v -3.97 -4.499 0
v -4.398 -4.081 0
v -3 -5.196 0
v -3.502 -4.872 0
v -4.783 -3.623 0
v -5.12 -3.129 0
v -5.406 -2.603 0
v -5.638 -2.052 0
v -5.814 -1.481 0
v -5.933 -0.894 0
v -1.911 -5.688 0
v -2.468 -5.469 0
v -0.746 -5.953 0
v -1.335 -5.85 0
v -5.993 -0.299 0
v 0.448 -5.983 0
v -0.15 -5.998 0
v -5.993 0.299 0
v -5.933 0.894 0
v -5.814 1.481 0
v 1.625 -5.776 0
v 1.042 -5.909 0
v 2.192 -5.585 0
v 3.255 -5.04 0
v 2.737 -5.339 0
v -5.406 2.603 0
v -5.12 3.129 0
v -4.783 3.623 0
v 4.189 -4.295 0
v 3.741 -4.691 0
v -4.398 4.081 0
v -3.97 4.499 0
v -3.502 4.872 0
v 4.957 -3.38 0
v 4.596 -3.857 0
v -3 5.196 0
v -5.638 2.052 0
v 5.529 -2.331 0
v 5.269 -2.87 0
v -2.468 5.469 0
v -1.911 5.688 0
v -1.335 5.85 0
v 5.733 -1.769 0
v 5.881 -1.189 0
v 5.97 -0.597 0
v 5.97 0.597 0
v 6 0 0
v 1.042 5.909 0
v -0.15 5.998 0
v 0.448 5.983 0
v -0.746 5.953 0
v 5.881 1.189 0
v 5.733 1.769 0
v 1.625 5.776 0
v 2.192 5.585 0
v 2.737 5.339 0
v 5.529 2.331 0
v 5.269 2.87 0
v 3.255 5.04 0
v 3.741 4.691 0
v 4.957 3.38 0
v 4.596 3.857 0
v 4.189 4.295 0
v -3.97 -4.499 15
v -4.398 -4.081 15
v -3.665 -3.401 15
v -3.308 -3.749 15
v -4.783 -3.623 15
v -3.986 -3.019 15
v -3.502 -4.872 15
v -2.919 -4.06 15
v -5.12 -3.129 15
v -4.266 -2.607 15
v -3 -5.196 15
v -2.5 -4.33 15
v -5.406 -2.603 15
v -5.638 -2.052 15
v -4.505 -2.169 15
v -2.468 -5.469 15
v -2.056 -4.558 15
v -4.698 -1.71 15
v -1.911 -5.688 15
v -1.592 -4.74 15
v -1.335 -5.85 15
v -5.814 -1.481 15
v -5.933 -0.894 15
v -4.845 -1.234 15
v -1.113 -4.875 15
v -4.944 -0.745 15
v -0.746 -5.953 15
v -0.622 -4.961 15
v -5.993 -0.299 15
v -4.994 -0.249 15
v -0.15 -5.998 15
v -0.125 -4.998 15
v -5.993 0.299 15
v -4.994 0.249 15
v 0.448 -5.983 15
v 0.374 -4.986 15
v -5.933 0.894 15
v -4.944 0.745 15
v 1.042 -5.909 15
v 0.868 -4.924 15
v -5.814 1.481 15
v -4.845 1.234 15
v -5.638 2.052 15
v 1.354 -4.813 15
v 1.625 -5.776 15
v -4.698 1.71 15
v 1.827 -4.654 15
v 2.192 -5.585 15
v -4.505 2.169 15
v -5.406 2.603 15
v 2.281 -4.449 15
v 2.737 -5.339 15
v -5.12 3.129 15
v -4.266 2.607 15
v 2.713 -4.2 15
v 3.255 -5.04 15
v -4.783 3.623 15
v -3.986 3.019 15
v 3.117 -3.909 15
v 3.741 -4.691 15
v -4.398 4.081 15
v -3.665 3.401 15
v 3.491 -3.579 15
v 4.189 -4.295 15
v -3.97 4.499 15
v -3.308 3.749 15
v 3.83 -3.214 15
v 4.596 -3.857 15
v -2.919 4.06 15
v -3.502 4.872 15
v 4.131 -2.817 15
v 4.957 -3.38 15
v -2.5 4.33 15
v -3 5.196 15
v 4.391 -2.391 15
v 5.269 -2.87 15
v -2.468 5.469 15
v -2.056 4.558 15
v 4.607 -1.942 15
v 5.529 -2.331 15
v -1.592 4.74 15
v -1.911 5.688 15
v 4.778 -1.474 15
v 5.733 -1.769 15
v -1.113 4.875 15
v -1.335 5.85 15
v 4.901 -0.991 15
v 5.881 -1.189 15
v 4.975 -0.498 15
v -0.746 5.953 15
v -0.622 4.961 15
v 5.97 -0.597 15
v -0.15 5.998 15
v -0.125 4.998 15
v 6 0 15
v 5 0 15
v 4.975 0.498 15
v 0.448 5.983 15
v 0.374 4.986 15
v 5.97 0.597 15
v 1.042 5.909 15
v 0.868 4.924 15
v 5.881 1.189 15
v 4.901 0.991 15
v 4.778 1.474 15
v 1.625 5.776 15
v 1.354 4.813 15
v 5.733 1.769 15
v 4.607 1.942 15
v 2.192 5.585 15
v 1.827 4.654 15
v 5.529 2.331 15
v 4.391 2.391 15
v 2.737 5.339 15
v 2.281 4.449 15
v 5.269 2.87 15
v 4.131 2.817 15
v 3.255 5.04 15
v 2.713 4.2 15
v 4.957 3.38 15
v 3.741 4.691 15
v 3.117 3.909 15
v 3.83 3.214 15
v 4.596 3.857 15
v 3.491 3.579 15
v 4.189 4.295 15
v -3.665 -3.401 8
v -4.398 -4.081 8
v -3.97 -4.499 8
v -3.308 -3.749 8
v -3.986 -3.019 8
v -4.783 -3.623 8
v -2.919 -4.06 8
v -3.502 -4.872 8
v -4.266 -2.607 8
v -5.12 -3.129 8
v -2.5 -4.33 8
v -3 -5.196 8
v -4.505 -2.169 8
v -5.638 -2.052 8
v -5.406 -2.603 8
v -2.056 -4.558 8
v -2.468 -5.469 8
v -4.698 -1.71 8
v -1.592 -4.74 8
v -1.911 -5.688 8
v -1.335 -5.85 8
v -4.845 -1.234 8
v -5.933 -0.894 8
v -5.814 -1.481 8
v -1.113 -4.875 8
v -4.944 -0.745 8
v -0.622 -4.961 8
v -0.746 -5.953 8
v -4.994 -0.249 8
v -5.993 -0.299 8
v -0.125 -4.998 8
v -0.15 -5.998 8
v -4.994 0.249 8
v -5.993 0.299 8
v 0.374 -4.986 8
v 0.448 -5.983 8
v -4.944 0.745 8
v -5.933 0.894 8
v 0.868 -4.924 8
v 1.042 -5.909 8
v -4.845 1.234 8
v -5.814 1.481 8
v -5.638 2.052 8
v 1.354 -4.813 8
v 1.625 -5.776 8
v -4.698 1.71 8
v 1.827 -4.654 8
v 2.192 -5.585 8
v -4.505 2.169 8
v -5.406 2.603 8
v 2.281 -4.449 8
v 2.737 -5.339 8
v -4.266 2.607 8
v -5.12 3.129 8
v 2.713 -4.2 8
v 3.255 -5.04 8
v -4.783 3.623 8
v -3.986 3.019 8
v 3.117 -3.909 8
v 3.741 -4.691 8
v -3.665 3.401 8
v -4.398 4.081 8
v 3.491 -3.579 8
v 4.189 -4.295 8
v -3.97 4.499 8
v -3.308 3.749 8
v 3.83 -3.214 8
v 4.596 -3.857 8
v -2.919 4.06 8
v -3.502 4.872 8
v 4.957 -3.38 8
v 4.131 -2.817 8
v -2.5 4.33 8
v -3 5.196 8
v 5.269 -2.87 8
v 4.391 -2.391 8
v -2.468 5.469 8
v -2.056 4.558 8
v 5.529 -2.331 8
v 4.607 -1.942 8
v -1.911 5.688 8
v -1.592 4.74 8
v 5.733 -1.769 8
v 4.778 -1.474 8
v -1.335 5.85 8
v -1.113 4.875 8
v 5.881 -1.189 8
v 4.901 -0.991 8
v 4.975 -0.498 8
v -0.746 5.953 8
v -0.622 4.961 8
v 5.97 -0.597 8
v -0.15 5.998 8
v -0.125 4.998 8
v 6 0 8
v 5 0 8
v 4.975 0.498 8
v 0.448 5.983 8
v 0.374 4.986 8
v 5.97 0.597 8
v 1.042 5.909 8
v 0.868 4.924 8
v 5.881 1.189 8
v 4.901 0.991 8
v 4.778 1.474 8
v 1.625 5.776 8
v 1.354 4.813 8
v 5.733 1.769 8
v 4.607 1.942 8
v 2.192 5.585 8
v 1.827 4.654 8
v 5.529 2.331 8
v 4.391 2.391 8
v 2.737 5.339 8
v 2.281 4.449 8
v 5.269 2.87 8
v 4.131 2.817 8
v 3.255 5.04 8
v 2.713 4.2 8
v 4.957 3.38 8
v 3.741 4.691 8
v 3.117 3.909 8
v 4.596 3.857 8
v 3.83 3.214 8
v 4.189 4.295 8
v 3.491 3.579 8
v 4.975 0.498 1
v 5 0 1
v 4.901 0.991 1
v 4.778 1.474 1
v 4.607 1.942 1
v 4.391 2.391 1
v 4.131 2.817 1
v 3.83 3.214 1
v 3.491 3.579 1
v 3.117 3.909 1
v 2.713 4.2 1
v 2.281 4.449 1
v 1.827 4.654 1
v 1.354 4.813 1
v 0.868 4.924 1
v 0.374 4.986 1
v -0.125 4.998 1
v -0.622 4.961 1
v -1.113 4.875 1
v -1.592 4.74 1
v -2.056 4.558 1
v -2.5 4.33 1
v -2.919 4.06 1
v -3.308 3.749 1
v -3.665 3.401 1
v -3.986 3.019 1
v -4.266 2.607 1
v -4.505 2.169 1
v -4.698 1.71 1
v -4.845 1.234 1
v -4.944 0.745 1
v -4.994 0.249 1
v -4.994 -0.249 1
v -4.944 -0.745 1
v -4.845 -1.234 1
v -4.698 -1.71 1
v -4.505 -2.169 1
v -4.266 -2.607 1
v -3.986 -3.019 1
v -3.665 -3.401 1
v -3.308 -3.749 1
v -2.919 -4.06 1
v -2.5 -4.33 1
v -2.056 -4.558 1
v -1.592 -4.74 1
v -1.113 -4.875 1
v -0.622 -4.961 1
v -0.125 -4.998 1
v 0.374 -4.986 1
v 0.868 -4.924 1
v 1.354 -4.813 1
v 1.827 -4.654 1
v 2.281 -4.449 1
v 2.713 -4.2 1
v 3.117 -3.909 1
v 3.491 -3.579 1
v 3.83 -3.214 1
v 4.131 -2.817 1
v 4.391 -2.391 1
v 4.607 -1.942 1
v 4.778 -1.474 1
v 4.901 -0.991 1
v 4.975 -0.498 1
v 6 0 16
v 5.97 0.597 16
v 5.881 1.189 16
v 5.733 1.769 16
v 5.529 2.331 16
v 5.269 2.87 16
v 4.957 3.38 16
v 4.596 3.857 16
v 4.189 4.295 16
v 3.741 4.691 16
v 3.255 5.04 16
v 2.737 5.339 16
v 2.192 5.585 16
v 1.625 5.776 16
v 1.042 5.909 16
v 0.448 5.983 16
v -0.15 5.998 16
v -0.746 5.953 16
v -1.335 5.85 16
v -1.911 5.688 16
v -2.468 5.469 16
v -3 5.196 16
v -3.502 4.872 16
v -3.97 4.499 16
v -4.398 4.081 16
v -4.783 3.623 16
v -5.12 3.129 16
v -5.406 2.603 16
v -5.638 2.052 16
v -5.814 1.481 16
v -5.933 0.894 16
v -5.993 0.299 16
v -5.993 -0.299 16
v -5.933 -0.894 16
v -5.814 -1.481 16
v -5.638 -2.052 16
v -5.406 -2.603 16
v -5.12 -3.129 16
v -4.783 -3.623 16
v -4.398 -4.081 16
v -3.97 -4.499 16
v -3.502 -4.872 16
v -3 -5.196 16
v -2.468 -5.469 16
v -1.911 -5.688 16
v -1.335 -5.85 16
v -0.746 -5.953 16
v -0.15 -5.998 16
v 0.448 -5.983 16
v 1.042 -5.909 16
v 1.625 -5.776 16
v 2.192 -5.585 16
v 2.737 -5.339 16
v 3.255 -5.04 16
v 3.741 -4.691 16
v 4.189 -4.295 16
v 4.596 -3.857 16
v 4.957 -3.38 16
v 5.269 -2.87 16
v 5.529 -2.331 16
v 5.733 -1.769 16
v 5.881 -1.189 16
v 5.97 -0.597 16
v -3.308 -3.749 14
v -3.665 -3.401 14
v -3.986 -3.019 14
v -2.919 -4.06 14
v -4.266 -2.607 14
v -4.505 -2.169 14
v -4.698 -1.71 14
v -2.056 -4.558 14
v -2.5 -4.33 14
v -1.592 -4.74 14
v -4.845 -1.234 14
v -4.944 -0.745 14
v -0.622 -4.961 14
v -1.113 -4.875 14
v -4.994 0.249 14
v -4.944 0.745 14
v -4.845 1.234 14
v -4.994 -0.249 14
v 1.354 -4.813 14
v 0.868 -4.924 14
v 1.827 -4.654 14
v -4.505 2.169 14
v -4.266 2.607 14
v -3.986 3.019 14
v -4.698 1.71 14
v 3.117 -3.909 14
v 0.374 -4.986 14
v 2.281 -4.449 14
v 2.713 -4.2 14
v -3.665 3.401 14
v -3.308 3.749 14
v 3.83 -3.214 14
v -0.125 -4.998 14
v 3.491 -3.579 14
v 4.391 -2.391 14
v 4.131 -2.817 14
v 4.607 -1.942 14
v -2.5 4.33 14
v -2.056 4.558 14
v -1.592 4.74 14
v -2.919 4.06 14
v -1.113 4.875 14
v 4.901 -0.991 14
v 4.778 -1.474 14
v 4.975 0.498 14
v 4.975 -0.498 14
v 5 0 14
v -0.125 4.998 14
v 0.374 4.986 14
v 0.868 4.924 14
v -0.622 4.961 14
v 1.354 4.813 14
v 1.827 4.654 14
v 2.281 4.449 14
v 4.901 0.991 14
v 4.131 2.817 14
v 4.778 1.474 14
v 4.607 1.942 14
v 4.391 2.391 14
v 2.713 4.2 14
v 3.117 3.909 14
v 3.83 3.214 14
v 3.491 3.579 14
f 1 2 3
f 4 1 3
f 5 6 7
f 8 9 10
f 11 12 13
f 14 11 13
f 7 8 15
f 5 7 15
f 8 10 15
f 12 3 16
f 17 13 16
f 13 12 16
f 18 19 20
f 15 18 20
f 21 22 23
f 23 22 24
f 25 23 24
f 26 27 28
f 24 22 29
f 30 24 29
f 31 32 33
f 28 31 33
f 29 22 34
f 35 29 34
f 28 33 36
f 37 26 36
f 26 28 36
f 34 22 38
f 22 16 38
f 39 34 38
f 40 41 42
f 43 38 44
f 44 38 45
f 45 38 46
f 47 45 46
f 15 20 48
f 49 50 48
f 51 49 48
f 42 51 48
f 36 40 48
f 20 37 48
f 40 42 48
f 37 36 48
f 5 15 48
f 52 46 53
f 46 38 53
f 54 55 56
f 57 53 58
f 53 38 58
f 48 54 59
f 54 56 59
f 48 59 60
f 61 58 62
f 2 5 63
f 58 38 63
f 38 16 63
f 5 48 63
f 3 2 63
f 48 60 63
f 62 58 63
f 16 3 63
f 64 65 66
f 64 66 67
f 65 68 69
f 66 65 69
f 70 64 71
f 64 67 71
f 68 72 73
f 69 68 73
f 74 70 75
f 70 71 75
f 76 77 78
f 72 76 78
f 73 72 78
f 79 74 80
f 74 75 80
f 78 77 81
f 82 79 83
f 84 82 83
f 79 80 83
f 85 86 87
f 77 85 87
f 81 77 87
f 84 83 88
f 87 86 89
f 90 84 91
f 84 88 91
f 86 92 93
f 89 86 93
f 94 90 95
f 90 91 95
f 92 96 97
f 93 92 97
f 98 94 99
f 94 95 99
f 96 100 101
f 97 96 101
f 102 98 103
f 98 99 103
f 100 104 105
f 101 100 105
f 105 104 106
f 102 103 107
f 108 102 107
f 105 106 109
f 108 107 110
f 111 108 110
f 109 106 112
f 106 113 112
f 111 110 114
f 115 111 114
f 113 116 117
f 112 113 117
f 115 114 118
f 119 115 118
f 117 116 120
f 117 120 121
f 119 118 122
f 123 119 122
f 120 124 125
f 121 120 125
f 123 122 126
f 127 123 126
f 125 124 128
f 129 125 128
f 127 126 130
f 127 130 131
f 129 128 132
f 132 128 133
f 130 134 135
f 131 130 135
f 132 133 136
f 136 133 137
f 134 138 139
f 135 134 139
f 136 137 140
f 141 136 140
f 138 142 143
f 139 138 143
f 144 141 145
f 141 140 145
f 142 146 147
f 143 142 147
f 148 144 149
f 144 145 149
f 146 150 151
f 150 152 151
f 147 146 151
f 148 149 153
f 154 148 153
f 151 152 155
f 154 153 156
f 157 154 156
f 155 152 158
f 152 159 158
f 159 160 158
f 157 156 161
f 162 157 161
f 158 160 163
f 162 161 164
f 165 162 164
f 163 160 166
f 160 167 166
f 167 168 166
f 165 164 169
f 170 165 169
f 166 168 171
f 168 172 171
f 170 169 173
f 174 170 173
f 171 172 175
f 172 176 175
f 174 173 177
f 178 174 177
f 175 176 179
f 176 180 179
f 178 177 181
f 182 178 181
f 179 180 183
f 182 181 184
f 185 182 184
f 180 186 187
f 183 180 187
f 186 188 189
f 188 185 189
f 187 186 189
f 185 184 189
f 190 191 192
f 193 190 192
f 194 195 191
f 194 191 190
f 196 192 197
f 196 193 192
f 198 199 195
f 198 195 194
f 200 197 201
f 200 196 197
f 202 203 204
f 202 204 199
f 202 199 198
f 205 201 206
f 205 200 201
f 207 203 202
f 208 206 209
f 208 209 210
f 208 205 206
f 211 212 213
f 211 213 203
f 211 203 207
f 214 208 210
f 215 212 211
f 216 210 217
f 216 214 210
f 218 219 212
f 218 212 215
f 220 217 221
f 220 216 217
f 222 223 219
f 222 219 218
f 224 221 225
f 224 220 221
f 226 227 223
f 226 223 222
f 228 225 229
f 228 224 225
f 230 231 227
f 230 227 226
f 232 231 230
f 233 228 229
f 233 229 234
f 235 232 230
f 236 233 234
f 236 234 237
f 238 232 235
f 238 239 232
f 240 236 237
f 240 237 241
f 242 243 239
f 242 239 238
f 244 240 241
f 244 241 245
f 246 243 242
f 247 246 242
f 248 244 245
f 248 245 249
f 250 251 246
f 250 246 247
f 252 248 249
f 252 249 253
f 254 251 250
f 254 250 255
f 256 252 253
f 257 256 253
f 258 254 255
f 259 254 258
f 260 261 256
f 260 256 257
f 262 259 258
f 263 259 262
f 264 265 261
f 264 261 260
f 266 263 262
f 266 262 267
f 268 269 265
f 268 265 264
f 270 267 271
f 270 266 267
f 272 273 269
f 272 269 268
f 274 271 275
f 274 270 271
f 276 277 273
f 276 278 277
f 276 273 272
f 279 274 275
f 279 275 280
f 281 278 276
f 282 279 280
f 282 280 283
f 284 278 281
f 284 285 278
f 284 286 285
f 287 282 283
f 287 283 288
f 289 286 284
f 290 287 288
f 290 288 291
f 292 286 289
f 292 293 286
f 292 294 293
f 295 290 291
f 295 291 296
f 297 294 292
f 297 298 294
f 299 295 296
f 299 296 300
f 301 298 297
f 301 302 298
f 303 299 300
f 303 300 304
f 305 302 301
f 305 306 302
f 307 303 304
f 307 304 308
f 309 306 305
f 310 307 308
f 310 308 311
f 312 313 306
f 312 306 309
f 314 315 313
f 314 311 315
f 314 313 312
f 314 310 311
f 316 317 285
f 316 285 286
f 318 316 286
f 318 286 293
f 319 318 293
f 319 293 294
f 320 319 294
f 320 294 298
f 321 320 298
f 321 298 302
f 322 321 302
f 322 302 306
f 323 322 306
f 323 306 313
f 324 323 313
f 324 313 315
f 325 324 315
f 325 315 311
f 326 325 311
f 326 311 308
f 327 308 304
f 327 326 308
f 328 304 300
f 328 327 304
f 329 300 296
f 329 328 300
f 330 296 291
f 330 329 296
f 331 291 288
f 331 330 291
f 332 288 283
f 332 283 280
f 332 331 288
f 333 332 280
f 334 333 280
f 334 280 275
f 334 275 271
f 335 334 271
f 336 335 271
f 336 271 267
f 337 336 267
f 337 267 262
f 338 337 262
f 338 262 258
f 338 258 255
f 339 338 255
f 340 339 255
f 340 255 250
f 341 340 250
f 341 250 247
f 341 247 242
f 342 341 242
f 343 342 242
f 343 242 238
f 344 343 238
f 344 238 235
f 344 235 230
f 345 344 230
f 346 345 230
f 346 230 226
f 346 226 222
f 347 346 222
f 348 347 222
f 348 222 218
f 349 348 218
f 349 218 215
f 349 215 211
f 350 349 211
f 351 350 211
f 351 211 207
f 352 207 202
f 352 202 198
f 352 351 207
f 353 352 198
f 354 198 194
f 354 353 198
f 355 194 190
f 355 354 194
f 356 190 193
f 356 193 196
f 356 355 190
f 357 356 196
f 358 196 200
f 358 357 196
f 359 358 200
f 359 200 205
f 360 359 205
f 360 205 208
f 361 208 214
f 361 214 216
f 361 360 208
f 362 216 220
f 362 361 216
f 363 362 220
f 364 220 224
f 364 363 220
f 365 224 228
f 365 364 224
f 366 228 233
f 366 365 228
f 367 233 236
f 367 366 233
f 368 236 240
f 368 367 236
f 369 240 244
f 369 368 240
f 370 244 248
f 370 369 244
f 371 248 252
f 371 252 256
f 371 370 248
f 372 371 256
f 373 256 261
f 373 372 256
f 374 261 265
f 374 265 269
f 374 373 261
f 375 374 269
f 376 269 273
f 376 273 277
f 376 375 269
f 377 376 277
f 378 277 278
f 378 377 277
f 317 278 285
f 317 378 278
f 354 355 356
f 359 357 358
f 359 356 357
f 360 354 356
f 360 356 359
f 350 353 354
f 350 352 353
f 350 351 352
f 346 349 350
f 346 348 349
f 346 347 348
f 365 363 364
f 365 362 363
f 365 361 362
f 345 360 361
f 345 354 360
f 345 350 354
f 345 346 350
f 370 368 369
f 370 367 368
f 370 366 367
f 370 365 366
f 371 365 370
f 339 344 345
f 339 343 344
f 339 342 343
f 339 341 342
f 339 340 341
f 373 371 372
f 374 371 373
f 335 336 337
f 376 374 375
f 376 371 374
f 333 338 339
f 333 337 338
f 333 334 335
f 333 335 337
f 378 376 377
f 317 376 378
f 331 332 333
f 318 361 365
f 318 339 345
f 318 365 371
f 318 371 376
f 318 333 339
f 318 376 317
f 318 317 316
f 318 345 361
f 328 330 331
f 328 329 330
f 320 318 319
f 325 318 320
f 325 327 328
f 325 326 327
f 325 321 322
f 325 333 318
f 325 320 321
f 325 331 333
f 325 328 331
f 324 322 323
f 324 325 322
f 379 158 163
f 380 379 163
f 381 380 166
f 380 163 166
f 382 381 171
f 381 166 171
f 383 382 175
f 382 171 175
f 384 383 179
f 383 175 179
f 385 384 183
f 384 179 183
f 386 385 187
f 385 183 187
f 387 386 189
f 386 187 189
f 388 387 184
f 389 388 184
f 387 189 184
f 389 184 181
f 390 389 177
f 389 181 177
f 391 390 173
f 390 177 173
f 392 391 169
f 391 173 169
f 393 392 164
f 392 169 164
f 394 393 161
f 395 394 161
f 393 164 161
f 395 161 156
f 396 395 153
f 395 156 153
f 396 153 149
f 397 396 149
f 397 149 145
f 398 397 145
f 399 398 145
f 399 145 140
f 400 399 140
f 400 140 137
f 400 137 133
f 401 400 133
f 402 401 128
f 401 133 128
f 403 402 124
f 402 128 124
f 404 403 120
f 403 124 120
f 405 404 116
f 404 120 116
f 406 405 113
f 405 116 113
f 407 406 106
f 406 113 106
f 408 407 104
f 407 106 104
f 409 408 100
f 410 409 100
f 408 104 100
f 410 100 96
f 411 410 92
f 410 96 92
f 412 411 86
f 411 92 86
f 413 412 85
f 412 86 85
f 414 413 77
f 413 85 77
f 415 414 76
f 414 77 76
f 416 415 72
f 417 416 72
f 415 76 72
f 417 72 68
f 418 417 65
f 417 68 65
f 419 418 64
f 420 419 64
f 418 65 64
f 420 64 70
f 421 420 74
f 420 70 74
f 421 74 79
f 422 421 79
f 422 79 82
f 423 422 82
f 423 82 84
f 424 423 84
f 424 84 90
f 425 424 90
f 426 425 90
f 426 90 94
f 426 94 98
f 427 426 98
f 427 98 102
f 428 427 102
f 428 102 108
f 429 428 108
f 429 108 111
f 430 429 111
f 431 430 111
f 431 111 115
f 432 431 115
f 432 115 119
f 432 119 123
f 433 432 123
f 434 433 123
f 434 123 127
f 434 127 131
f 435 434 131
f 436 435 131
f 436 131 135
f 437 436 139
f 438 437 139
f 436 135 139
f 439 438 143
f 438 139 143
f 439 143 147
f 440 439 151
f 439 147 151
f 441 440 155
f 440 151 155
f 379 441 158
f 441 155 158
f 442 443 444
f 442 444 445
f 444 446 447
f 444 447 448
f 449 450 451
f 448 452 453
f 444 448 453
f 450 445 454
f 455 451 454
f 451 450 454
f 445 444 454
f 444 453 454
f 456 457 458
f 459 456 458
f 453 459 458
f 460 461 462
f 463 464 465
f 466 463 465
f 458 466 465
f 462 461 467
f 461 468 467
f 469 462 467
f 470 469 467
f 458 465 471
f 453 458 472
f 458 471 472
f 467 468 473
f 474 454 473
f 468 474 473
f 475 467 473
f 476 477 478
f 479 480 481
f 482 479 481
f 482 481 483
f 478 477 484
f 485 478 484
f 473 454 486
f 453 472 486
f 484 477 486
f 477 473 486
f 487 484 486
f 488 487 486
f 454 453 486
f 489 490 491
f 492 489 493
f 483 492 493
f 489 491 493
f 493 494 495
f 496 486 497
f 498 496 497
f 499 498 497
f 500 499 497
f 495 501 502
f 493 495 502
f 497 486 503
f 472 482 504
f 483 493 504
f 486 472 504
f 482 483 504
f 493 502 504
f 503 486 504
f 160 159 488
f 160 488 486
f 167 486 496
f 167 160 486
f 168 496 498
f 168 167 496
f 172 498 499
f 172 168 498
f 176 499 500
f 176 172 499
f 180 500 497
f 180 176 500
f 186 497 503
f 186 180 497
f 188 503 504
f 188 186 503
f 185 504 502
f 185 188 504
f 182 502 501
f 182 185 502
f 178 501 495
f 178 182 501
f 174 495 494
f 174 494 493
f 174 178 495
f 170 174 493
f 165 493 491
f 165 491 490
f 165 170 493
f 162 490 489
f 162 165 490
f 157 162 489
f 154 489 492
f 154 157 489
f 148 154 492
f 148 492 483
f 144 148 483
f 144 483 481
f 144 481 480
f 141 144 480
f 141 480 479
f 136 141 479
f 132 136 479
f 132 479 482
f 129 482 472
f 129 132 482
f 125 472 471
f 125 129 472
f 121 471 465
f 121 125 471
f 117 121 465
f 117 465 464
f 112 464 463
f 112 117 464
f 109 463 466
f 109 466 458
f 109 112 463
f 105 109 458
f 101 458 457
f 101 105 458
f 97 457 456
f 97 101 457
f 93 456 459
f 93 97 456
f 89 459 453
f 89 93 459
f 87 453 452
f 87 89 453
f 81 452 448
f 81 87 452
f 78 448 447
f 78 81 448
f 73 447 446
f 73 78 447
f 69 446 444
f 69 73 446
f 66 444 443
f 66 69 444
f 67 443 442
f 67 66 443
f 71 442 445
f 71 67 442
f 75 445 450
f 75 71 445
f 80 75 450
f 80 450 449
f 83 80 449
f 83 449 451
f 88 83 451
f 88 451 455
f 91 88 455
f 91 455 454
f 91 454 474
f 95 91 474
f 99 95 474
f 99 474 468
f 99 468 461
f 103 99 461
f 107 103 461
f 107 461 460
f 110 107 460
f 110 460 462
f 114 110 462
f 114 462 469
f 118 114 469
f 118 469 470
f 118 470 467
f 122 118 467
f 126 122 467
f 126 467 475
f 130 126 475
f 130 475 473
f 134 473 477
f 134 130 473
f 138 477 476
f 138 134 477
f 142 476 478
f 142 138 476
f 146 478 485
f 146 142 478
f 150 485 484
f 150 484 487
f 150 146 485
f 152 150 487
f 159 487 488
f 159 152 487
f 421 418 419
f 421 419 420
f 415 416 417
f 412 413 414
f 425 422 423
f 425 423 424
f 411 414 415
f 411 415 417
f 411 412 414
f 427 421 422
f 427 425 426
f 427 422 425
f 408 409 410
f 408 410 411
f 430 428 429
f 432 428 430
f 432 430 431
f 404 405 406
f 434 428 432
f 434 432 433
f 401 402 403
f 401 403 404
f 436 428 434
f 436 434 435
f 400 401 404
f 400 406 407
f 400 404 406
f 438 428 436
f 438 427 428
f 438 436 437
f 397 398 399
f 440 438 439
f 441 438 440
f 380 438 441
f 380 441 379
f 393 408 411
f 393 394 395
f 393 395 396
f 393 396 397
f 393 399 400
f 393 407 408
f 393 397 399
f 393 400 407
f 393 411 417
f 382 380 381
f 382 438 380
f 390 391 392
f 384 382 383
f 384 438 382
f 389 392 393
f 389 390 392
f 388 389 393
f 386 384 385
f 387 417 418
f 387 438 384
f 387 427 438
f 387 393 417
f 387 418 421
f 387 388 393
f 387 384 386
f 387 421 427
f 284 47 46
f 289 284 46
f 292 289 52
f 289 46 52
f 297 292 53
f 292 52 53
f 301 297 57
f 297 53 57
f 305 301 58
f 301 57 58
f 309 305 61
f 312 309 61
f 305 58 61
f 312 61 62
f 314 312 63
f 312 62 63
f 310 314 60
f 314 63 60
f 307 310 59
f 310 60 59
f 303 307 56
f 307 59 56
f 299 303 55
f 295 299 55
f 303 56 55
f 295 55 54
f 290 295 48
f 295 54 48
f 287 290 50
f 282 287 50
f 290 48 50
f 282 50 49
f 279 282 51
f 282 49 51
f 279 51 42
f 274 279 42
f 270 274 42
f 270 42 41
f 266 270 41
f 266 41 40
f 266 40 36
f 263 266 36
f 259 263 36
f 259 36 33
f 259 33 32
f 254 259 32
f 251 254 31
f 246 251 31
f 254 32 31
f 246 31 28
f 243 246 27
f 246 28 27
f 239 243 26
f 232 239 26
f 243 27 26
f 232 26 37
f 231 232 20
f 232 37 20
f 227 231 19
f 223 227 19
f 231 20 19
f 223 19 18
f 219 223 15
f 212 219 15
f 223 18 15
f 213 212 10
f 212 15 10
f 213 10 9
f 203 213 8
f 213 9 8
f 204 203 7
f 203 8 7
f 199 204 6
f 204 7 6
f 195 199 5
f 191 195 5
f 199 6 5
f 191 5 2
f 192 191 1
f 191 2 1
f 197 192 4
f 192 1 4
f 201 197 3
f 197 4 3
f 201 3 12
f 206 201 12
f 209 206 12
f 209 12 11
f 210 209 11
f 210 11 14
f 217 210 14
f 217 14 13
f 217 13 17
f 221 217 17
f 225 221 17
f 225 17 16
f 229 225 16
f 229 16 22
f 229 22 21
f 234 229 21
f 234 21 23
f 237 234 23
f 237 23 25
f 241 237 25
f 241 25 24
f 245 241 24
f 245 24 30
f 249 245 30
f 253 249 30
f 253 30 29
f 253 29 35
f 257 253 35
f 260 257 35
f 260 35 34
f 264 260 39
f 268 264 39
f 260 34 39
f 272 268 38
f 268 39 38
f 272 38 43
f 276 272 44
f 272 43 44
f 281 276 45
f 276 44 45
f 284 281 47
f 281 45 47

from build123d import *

# Parameters (mm, degrees)
F0_R      = 6
F1_DEPTH  = 8
F2_T      = -1
F4_R      = 5
F5_DEPTH  = 1
F4_R_2    = 6
F5_FACE_R = 5
F6_DEPTH  = 1


with BuildPart() as f1:
    # F0 (on Top) → F1 (new body)
    with BuildSketch(Plane.XY):
        Circle(F0_R)
    extrude(amount=F1_DEPTH)

    # F2
    f2_openings = [f1.faces().sort_by_distance(p)[0] for p in [
        (0, 0, 8),
    ]]
    offset(amount=F2_T, openings=f2_openings)


with BuildPart() as f5:
    # F4 (on offset) → F5 (new body)
    with BuildSketch(Plane.XY.offset(15)):
        Circle(F4_R)
    extrude(amount=-F5_DEPTH)

    # F4 (on offset) + F5_face (on face) → F6 (join)
    with BuildSketch(Plane.XY.offset(15)):
        Circle(F4_R_2)
        Circle(F4_R, mode=Mode.SUBTRACT)
    with BuildSketch(Plane.XY.offset(15)):
        Circle(F5_FACE_R)
    extrude(amount=F6_DEPTH)


solid = Compound([f1.part, f5.part])
